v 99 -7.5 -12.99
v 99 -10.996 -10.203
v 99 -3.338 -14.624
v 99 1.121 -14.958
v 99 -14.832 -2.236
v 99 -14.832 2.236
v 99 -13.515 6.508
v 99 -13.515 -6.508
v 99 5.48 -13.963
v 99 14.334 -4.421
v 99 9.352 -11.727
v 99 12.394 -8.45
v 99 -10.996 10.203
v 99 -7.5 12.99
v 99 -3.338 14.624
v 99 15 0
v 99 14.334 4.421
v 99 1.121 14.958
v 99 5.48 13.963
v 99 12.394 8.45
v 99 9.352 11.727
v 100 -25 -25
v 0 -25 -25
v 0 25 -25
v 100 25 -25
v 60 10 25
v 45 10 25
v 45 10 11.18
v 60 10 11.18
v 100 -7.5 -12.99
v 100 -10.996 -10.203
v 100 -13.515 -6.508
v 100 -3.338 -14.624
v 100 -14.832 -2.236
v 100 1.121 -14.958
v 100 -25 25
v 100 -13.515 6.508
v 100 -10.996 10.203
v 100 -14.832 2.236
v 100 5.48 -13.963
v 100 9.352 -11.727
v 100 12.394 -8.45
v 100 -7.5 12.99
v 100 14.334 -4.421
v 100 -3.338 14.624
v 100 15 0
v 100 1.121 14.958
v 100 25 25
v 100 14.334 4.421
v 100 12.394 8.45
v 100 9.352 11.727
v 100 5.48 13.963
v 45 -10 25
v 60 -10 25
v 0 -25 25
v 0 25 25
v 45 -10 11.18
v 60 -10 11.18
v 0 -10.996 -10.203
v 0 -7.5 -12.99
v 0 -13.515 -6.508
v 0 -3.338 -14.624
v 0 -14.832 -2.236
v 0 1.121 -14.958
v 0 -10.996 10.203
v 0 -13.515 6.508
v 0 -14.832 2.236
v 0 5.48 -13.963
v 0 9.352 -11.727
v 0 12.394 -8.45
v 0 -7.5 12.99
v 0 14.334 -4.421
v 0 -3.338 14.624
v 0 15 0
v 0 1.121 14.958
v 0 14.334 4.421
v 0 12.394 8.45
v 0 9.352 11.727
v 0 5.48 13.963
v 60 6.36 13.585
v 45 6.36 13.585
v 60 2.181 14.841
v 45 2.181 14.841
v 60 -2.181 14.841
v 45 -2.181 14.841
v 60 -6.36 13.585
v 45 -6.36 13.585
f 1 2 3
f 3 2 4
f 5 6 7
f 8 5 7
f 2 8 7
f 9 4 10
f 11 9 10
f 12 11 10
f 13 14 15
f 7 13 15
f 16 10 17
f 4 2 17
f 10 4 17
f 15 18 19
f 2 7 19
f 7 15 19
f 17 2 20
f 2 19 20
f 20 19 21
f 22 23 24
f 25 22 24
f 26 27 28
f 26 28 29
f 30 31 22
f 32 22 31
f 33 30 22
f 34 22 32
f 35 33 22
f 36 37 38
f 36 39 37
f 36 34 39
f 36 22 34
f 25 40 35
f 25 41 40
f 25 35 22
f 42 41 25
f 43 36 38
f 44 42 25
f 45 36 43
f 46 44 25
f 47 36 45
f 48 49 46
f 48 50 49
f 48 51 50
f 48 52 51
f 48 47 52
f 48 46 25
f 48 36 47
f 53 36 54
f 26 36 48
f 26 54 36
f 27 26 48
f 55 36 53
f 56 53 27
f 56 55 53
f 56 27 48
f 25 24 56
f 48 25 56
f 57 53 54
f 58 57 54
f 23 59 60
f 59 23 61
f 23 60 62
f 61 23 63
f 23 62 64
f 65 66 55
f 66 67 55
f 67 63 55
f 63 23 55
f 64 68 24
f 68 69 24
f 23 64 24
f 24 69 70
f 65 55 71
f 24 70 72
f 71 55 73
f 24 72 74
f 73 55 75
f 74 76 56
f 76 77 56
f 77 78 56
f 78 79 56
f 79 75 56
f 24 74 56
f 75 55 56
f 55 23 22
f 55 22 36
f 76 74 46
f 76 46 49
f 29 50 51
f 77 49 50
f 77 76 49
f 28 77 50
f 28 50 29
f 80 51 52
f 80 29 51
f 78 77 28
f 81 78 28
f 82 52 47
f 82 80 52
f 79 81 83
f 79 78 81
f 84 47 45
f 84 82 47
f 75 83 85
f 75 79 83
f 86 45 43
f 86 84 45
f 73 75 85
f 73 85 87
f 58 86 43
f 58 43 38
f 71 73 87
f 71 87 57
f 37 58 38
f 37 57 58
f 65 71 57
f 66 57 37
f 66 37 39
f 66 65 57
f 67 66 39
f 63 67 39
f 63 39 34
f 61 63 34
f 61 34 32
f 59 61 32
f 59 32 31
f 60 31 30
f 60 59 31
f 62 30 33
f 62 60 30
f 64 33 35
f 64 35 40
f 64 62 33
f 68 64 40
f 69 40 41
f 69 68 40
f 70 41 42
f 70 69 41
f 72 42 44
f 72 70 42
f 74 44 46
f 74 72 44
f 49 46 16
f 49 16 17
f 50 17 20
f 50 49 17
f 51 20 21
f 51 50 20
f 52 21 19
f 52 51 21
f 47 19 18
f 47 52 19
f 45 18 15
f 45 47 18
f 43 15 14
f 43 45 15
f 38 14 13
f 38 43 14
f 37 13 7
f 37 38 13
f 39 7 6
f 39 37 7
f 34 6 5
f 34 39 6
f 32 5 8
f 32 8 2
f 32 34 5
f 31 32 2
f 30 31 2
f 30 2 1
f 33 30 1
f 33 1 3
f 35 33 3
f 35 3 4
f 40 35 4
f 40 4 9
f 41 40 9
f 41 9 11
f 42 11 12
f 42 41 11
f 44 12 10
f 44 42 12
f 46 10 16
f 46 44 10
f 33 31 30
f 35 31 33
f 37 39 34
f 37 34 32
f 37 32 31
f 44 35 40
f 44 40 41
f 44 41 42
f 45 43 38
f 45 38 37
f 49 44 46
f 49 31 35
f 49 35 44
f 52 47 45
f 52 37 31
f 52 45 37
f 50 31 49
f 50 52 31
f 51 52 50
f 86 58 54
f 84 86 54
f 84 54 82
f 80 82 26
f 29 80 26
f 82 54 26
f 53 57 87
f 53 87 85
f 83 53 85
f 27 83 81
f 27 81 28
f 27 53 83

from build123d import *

# Parameters (mm, degrees)
F0_W     = 50
F0_H     = 50
F0_R     = 15
F1_DEPTH = 100
F2_W     = 15
F2_H     = 20
F3_DEPTH = 25
F4_R     = 15
F5_DEPTH = 1


with BuildPart() as f1:
    # F0 (on Right) → F1 (new body)
    with BuildSketch(Plane.YZ):
        Rectangle(F0_W, F0_H)
        Circle(F0_R, mode=Mode.SUBTRACT)
    extrude(amount=F1_DEPTH)

    # F2 (on face) → F3 (cut)
    with BuildSketch(Plane.XY.offset(25)):
        with Locations((52.5, 0)):
            Rectangle(F2_W, F2_H)
    extrude(amount=-F3_DEPTH, mode=Mode.SUBTRACT)


with BuildPart() as f5:
    # F4 (on face) → F5 (new body)
    with BuildSketch(Plane.YZ.offset(100)):
        Circle(F4_R)
    extrude(amount=-F5_DEPTH)


solid = Compound([f1.part, f5.part])
